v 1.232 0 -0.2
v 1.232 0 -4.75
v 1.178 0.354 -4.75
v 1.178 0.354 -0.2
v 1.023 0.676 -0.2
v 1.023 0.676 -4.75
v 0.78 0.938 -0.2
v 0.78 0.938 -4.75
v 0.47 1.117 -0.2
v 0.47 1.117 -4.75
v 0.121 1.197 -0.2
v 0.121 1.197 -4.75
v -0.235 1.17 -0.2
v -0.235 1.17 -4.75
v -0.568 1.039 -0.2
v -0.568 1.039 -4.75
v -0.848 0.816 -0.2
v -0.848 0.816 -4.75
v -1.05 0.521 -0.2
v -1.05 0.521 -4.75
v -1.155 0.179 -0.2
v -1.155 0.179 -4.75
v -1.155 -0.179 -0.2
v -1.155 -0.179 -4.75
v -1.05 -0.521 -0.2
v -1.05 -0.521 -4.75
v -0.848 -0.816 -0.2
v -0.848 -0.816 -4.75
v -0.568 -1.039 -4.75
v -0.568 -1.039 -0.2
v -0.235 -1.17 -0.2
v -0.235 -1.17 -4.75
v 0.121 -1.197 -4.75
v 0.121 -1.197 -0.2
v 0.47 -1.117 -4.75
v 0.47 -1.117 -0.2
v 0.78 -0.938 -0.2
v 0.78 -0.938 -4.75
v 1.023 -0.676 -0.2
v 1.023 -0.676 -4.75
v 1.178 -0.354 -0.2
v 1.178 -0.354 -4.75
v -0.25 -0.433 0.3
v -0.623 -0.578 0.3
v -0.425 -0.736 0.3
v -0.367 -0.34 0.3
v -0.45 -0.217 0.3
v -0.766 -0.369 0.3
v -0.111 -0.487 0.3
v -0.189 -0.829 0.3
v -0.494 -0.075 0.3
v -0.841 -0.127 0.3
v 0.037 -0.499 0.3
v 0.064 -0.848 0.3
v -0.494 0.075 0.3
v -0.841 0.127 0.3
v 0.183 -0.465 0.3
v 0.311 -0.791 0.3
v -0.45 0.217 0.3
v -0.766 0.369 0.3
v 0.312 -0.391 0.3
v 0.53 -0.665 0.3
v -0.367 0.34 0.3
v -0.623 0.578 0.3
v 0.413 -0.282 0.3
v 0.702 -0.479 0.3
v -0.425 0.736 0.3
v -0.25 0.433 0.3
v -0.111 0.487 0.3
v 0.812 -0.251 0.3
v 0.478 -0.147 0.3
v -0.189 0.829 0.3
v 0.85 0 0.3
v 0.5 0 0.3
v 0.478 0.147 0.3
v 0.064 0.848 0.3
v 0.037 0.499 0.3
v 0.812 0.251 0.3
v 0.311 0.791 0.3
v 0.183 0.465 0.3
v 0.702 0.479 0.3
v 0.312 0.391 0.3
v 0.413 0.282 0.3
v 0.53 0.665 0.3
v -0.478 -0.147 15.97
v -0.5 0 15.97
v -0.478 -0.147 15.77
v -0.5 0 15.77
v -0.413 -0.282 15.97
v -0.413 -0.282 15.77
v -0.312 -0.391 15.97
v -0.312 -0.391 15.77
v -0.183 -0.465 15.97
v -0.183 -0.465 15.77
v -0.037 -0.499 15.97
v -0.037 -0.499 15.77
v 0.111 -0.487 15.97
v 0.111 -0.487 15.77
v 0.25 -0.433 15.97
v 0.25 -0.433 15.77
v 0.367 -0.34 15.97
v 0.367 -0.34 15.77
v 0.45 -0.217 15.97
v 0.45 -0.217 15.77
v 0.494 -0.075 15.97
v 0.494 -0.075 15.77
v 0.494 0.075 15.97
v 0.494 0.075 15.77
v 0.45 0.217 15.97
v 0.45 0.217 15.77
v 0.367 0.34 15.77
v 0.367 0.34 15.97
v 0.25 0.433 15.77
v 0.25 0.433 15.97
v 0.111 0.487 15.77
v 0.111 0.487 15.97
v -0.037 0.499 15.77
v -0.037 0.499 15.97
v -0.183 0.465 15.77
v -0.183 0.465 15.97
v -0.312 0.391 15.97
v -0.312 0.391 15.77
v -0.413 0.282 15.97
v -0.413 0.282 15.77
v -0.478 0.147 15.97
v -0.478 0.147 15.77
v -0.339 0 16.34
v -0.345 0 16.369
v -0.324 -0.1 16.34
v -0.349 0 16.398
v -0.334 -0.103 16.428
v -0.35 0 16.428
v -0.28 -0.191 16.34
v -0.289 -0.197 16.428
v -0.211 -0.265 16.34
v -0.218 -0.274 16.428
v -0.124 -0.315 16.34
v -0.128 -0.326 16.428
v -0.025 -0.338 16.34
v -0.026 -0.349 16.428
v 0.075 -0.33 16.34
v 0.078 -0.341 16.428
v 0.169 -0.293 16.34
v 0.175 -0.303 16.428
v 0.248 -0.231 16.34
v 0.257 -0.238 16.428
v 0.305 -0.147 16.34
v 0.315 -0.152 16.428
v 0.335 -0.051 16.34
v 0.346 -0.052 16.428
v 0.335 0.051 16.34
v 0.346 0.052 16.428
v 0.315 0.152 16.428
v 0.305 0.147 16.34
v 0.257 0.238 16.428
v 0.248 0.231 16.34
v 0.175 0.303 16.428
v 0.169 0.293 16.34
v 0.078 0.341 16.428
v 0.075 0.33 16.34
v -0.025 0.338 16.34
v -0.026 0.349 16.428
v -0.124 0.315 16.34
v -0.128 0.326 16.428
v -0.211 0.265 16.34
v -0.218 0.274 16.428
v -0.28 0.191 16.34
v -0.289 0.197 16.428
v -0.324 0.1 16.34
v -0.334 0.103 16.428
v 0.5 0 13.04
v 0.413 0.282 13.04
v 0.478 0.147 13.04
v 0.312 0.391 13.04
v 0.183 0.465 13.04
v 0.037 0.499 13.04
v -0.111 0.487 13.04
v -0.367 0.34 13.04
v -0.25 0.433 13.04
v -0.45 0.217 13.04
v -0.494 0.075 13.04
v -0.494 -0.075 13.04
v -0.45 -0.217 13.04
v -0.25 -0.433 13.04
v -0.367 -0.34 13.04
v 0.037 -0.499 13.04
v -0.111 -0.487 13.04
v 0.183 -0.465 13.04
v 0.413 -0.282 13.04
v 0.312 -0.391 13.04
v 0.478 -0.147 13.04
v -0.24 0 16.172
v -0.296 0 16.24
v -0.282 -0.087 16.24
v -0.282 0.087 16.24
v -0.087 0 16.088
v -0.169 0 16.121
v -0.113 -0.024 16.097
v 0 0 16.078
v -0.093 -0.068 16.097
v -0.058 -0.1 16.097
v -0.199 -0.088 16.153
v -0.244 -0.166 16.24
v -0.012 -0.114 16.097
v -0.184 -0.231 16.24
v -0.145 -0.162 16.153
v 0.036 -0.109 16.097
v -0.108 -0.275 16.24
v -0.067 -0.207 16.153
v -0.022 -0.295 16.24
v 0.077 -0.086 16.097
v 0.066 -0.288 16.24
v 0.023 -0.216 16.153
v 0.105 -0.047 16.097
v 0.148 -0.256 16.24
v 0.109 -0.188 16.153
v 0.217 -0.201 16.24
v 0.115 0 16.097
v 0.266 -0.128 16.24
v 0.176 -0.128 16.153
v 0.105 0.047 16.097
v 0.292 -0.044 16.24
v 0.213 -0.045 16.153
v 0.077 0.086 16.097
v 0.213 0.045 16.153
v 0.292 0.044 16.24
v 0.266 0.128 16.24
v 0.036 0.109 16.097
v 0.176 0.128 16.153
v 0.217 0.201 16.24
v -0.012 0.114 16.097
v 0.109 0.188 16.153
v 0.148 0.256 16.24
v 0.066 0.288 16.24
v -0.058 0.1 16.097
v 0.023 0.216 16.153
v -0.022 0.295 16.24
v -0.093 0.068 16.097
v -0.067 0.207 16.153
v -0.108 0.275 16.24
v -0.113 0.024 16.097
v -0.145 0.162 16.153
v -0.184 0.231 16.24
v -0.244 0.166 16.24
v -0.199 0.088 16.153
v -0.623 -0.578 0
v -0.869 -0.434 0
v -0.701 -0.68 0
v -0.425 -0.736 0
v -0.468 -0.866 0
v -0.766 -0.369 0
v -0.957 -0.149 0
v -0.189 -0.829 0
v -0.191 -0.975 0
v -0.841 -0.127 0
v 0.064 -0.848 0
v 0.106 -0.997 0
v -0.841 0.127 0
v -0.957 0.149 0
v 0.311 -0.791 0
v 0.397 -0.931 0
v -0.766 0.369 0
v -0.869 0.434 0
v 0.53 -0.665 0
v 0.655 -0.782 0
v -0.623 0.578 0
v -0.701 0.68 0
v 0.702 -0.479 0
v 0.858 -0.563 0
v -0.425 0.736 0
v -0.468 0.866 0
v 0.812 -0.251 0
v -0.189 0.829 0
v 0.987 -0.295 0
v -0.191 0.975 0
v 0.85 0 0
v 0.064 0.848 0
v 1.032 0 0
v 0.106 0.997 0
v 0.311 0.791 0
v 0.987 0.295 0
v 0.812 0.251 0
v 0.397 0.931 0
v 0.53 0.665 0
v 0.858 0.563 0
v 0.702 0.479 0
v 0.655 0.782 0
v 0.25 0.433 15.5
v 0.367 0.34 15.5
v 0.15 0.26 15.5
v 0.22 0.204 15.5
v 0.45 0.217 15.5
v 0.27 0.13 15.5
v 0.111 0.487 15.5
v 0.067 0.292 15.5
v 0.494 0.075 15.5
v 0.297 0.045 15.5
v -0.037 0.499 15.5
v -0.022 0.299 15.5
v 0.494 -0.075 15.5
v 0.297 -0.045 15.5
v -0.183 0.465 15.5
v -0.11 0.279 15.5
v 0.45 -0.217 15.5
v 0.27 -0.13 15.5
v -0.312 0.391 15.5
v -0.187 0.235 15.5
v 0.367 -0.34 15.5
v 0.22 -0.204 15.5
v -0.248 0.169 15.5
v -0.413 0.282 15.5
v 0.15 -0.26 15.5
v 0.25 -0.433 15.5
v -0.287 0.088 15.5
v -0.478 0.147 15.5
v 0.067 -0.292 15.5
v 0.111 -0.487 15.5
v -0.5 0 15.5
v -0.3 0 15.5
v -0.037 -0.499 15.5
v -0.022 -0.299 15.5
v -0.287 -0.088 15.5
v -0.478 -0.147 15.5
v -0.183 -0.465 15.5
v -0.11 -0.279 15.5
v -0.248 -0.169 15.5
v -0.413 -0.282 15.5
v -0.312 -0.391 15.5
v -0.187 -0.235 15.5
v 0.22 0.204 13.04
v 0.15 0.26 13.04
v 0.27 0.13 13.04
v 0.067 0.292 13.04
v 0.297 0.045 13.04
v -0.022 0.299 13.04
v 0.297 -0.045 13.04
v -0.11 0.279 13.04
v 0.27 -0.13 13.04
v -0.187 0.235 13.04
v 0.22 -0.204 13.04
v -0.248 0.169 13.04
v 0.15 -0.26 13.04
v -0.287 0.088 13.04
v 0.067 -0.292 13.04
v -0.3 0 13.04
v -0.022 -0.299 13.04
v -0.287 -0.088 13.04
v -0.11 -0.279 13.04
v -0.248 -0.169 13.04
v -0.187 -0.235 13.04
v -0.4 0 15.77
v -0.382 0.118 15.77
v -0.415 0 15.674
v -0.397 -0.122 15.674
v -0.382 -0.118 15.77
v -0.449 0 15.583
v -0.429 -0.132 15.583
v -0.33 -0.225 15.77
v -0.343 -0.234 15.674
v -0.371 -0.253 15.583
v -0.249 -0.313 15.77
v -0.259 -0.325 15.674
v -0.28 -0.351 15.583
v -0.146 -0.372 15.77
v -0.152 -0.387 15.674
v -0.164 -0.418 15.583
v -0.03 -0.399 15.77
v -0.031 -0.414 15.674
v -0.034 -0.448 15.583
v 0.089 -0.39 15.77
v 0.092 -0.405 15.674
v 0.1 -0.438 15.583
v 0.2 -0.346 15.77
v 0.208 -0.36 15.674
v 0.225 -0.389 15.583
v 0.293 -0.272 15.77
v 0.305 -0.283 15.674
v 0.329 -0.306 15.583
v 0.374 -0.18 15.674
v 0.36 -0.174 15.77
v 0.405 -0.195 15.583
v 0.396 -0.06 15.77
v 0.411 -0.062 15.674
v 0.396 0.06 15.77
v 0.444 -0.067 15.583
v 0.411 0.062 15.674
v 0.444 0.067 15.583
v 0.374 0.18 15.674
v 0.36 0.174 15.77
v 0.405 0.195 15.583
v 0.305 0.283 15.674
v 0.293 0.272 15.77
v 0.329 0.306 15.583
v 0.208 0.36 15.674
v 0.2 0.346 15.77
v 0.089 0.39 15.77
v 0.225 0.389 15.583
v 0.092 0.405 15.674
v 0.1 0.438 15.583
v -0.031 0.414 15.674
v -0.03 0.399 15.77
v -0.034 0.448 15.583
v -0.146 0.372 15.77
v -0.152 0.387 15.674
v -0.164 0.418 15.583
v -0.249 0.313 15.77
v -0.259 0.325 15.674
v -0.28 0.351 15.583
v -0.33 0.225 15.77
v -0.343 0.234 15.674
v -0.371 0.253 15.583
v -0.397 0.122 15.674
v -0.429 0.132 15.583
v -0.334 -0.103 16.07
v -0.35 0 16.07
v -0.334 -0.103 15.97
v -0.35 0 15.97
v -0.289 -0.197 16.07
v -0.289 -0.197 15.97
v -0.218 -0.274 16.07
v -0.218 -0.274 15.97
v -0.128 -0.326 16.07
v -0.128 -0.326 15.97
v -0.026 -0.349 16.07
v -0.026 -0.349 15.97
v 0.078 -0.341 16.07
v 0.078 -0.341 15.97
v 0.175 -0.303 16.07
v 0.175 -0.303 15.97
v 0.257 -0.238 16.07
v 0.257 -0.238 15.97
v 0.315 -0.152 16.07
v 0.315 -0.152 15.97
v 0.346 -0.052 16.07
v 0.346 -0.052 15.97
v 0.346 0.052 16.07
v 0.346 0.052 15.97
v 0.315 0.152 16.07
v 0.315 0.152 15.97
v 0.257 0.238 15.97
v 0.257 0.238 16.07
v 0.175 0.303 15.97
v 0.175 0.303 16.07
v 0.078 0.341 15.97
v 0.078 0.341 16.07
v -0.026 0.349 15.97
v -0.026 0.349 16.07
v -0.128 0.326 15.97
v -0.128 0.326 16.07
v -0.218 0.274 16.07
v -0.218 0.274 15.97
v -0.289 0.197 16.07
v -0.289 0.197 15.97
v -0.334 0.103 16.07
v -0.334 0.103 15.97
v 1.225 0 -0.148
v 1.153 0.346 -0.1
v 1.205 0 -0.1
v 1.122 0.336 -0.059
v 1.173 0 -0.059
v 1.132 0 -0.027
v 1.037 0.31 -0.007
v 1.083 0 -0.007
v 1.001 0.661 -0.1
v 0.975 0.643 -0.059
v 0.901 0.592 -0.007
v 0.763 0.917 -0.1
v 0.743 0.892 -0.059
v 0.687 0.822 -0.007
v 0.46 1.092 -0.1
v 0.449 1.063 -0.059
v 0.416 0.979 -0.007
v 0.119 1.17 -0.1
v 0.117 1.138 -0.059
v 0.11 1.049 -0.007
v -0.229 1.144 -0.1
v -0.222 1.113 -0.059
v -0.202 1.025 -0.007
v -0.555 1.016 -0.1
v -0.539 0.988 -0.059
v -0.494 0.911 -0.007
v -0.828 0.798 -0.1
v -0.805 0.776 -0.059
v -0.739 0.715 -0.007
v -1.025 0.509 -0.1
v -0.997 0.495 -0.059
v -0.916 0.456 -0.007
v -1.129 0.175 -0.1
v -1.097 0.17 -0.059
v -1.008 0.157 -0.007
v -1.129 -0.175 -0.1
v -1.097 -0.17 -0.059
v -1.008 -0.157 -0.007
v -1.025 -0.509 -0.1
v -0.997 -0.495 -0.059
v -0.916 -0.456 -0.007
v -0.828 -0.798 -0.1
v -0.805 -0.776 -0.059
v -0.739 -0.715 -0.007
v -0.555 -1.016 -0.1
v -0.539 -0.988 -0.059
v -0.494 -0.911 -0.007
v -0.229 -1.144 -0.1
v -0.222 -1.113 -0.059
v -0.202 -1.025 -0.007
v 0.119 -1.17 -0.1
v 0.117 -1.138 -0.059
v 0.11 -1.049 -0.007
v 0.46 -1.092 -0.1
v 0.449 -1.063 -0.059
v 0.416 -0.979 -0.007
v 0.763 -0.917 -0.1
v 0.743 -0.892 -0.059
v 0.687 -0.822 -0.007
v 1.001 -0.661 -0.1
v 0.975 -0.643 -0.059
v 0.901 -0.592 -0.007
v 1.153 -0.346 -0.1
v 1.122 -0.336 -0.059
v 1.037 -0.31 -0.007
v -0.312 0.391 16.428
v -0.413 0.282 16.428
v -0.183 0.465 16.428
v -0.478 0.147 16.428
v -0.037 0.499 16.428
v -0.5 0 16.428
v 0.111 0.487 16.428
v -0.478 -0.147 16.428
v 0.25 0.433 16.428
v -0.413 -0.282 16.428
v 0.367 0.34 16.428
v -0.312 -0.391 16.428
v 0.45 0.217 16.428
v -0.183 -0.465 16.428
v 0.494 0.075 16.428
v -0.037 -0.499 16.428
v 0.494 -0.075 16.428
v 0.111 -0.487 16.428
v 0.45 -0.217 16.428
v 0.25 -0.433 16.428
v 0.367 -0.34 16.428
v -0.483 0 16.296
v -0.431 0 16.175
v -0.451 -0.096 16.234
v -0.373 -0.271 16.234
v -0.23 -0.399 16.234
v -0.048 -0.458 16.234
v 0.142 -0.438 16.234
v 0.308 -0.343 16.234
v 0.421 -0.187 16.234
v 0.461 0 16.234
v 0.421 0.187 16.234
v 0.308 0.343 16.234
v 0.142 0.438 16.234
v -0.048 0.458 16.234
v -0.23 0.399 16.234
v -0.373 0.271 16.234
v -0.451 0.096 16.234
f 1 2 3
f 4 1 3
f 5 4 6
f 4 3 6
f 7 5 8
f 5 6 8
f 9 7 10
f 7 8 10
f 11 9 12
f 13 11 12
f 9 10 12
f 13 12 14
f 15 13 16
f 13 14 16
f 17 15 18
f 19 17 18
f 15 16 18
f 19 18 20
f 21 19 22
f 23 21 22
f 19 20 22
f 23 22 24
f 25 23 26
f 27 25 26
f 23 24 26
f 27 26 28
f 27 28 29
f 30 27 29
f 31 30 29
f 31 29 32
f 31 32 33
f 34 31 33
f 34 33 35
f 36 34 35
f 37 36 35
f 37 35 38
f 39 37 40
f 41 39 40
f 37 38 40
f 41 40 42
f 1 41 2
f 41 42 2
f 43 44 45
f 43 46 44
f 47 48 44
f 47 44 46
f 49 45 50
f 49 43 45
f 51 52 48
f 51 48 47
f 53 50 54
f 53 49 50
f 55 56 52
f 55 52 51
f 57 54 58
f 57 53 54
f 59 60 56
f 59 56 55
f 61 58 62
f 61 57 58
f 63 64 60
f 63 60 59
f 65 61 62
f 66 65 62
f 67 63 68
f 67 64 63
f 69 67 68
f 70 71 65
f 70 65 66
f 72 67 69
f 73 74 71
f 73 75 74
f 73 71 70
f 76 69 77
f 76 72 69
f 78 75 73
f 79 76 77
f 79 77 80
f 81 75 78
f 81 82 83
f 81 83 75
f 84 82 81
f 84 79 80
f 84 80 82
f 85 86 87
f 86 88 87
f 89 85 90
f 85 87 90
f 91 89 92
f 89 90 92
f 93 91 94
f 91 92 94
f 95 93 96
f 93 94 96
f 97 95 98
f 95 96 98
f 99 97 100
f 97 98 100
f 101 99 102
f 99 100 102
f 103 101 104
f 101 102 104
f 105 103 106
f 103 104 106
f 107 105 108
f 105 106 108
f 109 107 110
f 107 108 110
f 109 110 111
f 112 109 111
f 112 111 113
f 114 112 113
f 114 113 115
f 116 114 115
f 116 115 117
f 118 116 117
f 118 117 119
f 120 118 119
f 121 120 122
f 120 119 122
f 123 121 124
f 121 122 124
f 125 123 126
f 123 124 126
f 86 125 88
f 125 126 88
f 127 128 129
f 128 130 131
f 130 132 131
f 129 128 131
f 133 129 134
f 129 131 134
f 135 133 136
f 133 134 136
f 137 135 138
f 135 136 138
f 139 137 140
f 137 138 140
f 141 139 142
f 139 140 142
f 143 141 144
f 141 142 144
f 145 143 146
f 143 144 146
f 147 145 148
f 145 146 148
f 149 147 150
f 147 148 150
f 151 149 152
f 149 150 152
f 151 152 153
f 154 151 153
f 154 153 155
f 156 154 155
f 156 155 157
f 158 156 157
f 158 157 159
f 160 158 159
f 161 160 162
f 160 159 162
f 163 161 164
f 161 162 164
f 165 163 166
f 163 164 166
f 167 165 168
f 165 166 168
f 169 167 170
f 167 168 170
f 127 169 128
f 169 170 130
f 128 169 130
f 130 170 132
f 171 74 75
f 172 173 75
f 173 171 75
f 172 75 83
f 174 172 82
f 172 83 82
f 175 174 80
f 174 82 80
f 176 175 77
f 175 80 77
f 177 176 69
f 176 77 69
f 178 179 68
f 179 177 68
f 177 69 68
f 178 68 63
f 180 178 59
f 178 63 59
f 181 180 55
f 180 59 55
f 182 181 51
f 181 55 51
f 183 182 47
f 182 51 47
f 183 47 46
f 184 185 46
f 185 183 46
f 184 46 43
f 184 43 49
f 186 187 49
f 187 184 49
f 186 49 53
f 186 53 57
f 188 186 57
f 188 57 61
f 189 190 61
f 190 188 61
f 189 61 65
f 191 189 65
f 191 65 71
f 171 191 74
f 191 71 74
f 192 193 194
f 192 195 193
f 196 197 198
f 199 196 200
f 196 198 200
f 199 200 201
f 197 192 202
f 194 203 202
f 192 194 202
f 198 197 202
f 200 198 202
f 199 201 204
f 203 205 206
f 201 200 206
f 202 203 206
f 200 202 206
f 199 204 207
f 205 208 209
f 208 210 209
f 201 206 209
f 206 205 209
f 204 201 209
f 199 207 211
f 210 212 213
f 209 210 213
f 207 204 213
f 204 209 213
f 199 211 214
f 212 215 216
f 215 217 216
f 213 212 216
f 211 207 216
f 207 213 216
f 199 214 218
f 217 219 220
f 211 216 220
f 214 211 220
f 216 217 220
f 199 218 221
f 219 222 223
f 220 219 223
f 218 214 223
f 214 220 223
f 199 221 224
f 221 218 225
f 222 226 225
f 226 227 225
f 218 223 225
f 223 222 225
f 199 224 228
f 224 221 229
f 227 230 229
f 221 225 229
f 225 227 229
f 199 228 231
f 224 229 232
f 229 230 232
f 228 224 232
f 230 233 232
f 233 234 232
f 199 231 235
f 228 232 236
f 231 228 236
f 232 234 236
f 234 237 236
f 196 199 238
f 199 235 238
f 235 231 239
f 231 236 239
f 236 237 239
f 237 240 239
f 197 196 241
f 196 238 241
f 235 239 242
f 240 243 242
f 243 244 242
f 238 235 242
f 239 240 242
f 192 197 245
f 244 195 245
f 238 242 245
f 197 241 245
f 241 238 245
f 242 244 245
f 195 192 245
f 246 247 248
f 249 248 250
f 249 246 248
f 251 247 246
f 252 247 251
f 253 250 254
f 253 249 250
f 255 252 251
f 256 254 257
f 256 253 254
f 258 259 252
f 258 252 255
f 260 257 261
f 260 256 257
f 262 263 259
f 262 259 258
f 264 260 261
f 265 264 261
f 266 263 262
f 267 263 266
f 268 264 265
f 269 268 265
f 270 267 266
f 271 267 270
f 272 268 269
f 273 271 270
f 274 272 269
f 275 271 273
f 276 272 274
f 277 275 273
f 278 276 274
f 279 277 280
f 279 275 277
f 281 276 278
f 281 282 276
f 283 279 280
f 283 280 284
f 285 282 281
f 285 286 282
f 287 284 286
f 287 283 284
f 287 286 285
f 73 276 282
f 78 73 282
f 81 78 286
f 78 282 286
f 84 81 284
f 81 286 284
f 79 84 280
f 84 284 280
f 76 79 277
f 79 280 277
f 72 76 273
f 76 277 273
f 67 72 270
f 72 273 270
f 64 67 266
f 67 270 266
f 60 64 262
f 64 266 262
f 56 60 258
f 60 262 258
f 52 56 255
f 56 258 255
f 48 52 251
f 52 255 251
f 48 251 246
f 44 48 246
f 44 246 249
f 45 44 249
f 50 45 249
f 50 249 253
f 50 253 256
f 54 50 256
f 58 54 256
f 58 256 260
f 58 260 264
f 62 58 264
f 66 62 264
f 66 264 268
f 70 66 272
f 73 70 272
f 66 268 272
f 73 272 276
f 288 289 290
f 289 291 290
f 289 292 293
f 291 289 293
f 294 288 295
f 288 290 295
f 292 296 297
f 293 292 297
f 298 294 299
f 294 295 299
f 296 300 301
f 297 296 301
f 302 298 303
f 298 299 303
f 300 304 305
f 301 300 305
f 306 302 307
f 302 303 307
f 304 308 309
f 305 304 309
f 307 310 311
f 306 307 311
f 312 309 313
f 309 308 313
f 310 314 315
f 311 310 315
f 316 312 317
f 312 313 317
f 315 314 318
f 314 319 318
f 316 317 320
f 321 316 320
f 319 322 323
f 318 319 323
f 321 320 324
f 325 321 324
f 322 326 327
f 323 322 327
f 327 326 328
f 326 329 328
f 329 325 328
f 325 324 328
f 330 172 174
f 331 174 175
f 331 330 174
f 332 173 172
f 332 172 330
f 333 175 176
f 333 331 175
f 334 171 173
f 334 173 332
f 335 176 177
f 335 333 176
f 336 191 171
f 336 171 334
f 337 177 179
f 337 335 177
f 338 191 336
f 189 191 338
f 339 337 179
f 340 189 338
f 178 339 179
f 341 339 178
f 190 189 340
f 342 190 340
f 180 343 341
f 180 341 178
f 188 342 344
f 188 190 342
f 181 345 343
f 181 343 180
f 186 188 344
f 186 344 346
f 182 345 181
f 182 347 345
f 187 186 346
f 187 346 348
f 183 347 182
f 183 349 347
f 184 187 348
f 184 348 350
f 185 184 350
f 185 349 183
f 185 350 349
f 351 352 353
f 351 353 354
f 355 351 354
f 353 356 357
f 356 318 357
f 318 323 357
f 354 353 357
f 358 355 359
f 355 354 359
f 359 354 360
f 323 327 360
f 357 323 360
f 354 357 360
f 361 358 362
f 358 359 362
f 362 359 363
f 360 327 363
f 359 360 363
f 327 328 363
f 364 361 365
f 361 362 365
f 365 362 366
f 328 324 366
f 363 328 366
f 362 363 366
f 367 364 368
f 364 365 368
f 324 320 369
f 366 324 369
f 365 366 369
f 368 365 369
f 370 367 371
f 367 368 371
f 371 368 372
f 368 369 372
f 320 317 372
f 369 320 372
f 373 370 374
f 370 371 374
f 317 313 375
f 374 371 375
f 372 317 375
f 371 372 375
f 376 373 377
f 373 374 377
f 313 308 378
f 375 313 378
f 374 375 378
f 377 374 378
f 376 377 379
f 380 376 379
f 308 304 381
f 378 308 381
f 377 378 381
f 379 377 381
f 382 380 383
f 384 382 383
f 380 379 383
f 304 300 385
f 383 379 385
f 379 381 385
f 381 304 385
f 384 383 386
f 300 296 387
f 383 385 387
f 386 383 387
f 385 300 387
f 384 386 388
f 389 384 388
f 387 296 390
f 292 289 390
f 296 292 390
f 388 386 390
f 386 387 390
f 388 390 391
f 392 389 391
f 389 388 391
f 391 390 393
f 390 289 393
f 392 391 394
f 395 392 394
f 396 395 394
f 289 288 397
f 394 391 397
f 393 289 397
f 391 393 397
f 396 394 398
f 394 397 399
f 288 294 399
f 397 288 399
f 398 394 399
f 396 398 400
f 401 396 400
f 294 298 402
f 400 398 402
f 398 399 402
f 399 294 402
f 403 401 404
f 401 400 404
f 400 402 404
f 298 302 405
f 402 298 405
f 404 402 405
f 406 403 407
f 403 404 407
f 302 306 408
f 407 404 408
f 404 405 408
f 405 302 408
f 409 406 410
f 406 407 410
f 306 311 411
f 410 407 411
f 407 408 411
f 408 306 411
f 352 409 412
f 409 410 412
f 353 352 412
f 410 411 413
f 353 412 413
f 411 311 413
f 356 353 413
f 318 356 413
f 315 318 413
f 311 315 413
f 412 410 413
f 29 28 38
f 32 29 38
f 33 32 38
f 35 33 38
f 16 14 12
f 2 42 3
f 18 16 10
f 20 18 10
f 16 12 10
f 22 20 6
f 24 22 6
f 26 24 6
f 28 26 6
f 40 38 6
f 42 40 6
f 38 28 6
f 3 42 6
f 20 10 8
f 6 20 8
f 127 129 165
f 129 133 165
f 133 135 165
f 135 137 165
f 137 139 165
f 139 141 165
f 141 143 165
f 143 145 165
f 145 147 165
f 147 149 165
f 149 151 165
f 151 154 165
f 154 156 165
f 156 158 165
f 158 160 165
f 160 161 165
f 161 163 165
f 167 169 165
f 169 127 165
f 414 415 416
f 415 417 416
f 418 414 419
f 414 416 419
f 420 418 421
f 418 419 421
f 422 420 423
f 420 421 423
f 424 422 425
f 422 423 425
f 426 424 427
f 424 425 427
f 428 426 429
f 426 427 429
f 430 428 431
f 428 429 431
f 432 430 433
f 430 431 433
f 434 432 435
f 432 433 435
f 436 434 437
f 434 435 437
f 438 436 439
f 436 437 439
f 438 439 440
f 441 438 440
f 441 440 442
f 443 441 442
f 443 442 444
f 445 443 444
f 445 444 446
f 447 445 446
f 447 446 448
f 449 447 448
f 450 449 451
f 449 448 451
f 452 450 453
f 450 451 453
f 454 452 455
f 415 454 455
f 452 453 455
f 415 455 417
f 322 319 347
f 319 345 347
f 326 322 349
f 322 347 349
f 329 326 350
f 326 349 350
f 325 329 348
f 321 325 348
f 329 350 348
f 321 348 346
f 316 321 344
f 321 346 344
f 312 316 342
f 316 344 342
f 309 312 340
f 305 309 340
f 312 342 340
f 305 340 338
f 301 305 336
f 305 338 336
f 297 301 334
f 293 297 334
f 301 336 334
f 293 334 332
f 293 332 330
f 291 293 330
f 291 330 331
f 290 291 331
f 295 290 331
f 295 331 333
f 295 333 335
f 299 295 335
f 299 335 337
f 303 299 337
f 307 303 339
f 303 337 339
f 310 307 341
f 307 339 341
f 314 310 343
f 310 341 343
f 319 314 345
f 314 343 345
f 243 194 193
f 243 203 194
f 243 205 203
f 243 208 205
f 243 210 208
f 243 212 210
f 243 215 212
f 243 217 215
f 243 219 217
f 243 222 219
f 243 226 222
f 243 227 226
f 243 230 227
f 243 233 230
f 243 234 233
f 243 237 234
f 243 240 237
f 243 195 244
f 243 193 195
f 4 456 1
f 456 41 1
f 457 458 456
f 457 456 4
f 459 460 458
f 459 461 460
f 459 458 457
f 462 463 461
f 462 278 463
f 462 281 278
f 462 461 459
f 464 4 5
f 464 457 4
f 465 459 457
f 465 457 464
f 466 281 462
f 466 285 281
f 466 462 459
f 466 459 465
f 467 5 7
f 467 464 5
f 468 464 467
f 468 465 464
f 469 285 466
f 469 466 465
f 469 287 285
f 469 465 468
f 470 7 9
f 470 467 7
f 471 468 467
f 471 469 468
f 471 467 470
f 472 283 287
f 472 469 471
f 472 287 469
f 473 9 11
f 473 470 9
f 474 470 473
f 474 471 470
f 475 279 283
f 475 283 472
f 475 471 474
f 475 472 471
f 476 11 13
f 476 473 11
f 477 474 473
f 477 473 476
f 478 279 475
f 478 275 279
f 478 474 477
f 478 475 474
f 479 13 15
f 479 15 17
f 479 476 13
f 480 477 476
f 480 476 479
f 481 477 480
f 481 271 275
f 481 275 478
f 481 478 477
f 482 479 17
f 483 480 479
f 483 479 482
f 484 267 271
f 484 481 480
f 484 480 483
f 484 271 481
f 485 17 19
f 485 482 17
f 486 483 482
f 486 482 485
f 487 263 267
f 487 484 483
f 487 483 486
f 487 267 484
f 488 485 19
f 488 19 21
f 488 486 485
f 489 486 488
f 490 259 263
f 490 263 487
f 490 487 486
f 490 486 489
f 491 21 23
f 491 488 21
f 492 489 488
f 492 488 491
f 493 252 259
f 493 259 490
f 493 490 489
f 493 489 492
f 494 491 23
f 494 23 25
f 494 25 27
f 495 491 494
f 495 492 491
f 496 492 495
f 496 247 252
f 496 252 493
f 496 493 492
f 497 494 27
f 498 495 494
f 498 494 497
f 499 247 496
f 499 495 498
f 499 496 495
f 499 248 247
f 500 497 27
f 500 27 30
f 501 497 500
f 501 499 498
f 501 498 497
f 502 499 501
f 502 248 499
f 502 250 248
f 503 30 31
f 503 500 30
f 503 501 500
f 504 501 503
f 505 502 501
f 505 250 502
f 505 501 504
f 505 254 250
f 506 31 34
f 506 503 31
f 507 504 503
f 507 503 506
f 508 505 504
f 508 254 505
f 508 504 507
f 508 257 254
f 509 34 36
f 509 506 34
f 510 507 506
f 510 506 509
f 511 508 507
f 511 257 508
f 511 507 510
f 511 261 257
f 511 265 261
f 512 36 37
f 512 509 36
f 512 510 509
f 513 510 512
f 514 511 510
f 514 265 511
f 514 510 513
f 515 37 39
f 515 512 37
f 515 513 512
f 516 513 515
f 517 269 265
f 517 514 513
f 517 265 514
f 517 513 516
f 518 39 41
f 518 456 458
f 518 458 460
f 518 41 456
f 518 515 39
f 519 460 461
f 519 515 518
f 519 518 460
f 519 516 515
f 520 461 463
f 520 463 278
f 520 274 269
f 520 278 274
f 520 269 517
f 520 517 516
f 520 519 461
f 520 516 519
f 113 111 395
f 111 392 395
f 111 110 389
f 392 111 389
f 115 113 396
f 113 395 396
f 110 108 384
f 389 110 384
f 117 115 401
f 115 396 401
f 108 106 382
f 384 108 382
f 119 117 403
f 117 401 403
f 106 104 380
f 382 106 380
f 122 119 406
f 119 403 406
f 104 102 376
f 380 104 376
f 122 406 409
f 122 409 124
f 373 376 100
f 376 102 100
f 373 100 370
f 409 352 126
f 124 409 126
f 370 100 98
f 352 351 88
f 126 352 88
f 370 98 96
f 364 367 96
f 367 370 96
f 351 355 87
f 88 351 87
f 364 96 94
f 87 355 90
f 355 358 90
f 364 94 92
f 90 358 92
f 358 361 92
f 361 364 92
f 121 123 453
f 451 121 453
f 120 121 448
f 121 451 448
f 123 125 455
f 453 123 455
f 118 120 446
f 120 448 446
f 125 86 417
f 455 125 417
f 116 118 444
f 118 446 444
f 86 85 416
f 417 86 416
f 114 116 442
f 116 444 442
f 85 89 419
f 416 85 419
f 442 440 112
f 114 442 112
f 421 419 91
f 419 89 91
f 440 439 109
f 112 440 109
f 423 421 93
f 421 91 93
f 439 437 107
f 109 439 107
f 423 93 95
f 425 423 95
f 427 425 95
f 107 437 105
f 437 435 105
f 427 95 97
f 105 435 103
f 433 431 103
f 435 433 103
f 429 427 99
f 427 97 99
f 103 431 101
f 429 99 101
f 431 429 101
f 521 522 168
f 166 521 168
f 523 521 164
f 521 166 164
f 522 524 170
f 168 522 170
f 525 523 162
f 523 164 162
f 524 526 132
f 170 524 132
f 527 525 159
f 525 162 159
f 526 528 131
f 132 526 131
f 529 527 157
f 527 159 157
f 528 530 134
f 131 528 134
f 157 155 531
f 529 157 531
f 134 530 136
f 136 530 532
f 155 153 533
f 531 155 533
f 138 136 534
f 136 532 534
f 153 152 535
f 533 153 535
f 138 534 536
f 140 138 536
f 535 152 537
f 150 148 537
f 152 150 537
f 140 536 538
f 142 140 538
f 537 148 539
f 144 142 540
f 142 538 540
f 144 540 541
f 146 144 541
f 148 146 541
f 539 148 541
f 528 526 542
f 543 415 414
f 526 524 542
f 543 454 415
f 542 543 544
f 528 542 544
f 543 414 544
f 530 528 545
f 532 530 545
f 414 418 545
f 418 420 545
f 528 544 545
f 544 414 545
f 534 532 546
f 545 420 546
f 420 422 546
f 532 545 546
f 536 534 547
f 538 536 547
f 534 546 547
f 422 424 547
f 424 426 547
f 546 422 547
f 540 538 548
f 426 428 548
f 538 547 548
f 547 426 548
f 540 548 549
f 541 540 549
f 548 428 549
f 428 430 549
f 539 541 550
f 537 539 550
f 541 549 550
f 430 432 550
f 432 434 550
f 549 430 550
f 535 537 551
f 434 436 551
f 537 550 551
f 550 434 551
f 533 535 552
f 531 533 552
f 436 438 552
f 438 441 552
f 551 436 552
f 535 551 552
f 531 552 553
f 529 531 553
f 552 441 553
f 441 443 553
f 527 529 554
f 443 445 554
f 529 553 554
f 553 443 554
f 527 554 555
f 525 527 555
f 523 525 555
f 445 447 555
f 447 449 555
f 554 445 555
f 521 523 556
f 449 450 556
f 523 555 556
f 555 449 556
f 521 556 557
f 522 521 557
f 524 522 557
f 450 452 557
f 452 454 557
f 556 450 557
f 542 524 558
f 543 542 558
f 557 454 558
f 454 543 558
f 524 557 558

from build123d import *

# Parameters (mm, degrees)
SKETCH1_R           = 0.5
BOSS_EXTRUDE1_DEPTH = 15.5
SKETCH1_3_R         = 1.2
BOSS_EXTRUDE2_DEPTH = 4.75
FILLET1_R           = 0.2
SKETCH2_R           = 0.85
BOSS_EXTRUDE3_DEPTH = 0.3
SKETCH4_W           = 0.445498432
SKETCH4_H           = 0.1
SKETCH5_W           = 0.773123016
SKETCH5_H           = 2.46
SKETCH5_2_W         = 0.773123016
SKETCH5_2_H         = 2.46


with BuildPart() as part:
    # Sketch1 → Boss-Extrude1 (new body)
    with BuildSketch(Plane.XY):
        Circle(SKETCH1_R)
    extrude(amount=BOSS_EXTRUDE1_DEPTH)

    # Sketch1<3> → Boss-Extrude2 (add)
    with BuildSketch(Plane.XY):
        with Locations((0.031563249, 0)):
            Circle(SKETCH1_3_R)
    extrude(amount=-BOSS_EXTRUDE2_DEPTH)

    # Fillet1
    fillet1_edges = [part.edges().sort_by_distance(p)[0] for p in [
        (-1.168436751, 0, 0),
    ]]
    fillet(fillet1_edges, radius=FILLET1_R)

    # Sketch2 → Boss-Extrude3 (add)
    with BuildSketch(Plane.XY):
        Circle(SKETCH2_R)
    extrude(amount=BOSS_EXTRUDE3_DEPTH)

    # Sketch3 → Revolve2 (revolve)
    with BuildSketch(Plane(origin=(0, 0, 0), x_dir=(1, 0, 0), z_dir=(0, 1, 0))):
        with BuildLine():
            Line((0, -15.5), (0, -16.0775))
            ThreePointArc((0, -16.0775), (0.247487373, -16.180012627), (0.35, -16.4275))
            Line((0.35, -16.4275), (0.5, -16.4275))
            ThreePointArc((0.5, -16.4275), (0.460977223, -16.233850833), (0.35, -16.070428579))
            Line((0.35, -16.070428579), (0.35, -15.970428579))
            Line((0.35, -15.970428579), (0.5, -15.970428579))
            Line((0.5, -15.970428579), (0.5, -15.770428579))
            Line((0.5, -15.770428579), (0.4, -15.770428579))
            ThreePointArc((0.4, -15.770428579), (0.430084247, -15.627849774), (0.5, -15.5))
            Line((0.5, -15.5), (0, -15.5))
        make_face()
    revolve(axis=Axis((0, 0, 15.5), (0, 0, 1)))

    # Sketch4 → Revolve3 (revolve)
    with BuildSketch(Plane(origin=(0, 0, 0), x_dir=(1, 0, 0), z_dir=(0, 1, 0))):
        with Locations((-0.222202563, -16.29)):
            Rectangle(SKETCH4_W, SKETCH4_H)
    revolve(axis=Axis((0.000546653, 0, 16.34), (0, 0, -1)))

    # Sketch5 → Revolve4 (revolve)
    with BuildSketch(Plane(origin=(0, 0, 0), x_dir=(1, 0, 0), z_dir=(0, 1, 0))):
        with Locations((-0.686561508, -14.27)):
            Rectangle(SKETCH5_W, SKETCH5_H)
    revolve(axis=Axis((0, 0, 15.5), (0, 0, 1)))

    # Sketch5<2> → Cut-Revolve1 (revolve, cut)
    with BuildSketch(Plane(origin=(0, 0, 0), x_dir=(1, 0, 0), z_dir=(0, 1, 0))):
        with Locations((-0.686561508, -14.27)):
            Rectangle(SKETCH5_2_W, SKETCH5_2_H)
    revolve(axis=Axis((0, 0, 15.5), (0, 0, 1)), mode=Mode.SUBTRACT)


solid = part.part
